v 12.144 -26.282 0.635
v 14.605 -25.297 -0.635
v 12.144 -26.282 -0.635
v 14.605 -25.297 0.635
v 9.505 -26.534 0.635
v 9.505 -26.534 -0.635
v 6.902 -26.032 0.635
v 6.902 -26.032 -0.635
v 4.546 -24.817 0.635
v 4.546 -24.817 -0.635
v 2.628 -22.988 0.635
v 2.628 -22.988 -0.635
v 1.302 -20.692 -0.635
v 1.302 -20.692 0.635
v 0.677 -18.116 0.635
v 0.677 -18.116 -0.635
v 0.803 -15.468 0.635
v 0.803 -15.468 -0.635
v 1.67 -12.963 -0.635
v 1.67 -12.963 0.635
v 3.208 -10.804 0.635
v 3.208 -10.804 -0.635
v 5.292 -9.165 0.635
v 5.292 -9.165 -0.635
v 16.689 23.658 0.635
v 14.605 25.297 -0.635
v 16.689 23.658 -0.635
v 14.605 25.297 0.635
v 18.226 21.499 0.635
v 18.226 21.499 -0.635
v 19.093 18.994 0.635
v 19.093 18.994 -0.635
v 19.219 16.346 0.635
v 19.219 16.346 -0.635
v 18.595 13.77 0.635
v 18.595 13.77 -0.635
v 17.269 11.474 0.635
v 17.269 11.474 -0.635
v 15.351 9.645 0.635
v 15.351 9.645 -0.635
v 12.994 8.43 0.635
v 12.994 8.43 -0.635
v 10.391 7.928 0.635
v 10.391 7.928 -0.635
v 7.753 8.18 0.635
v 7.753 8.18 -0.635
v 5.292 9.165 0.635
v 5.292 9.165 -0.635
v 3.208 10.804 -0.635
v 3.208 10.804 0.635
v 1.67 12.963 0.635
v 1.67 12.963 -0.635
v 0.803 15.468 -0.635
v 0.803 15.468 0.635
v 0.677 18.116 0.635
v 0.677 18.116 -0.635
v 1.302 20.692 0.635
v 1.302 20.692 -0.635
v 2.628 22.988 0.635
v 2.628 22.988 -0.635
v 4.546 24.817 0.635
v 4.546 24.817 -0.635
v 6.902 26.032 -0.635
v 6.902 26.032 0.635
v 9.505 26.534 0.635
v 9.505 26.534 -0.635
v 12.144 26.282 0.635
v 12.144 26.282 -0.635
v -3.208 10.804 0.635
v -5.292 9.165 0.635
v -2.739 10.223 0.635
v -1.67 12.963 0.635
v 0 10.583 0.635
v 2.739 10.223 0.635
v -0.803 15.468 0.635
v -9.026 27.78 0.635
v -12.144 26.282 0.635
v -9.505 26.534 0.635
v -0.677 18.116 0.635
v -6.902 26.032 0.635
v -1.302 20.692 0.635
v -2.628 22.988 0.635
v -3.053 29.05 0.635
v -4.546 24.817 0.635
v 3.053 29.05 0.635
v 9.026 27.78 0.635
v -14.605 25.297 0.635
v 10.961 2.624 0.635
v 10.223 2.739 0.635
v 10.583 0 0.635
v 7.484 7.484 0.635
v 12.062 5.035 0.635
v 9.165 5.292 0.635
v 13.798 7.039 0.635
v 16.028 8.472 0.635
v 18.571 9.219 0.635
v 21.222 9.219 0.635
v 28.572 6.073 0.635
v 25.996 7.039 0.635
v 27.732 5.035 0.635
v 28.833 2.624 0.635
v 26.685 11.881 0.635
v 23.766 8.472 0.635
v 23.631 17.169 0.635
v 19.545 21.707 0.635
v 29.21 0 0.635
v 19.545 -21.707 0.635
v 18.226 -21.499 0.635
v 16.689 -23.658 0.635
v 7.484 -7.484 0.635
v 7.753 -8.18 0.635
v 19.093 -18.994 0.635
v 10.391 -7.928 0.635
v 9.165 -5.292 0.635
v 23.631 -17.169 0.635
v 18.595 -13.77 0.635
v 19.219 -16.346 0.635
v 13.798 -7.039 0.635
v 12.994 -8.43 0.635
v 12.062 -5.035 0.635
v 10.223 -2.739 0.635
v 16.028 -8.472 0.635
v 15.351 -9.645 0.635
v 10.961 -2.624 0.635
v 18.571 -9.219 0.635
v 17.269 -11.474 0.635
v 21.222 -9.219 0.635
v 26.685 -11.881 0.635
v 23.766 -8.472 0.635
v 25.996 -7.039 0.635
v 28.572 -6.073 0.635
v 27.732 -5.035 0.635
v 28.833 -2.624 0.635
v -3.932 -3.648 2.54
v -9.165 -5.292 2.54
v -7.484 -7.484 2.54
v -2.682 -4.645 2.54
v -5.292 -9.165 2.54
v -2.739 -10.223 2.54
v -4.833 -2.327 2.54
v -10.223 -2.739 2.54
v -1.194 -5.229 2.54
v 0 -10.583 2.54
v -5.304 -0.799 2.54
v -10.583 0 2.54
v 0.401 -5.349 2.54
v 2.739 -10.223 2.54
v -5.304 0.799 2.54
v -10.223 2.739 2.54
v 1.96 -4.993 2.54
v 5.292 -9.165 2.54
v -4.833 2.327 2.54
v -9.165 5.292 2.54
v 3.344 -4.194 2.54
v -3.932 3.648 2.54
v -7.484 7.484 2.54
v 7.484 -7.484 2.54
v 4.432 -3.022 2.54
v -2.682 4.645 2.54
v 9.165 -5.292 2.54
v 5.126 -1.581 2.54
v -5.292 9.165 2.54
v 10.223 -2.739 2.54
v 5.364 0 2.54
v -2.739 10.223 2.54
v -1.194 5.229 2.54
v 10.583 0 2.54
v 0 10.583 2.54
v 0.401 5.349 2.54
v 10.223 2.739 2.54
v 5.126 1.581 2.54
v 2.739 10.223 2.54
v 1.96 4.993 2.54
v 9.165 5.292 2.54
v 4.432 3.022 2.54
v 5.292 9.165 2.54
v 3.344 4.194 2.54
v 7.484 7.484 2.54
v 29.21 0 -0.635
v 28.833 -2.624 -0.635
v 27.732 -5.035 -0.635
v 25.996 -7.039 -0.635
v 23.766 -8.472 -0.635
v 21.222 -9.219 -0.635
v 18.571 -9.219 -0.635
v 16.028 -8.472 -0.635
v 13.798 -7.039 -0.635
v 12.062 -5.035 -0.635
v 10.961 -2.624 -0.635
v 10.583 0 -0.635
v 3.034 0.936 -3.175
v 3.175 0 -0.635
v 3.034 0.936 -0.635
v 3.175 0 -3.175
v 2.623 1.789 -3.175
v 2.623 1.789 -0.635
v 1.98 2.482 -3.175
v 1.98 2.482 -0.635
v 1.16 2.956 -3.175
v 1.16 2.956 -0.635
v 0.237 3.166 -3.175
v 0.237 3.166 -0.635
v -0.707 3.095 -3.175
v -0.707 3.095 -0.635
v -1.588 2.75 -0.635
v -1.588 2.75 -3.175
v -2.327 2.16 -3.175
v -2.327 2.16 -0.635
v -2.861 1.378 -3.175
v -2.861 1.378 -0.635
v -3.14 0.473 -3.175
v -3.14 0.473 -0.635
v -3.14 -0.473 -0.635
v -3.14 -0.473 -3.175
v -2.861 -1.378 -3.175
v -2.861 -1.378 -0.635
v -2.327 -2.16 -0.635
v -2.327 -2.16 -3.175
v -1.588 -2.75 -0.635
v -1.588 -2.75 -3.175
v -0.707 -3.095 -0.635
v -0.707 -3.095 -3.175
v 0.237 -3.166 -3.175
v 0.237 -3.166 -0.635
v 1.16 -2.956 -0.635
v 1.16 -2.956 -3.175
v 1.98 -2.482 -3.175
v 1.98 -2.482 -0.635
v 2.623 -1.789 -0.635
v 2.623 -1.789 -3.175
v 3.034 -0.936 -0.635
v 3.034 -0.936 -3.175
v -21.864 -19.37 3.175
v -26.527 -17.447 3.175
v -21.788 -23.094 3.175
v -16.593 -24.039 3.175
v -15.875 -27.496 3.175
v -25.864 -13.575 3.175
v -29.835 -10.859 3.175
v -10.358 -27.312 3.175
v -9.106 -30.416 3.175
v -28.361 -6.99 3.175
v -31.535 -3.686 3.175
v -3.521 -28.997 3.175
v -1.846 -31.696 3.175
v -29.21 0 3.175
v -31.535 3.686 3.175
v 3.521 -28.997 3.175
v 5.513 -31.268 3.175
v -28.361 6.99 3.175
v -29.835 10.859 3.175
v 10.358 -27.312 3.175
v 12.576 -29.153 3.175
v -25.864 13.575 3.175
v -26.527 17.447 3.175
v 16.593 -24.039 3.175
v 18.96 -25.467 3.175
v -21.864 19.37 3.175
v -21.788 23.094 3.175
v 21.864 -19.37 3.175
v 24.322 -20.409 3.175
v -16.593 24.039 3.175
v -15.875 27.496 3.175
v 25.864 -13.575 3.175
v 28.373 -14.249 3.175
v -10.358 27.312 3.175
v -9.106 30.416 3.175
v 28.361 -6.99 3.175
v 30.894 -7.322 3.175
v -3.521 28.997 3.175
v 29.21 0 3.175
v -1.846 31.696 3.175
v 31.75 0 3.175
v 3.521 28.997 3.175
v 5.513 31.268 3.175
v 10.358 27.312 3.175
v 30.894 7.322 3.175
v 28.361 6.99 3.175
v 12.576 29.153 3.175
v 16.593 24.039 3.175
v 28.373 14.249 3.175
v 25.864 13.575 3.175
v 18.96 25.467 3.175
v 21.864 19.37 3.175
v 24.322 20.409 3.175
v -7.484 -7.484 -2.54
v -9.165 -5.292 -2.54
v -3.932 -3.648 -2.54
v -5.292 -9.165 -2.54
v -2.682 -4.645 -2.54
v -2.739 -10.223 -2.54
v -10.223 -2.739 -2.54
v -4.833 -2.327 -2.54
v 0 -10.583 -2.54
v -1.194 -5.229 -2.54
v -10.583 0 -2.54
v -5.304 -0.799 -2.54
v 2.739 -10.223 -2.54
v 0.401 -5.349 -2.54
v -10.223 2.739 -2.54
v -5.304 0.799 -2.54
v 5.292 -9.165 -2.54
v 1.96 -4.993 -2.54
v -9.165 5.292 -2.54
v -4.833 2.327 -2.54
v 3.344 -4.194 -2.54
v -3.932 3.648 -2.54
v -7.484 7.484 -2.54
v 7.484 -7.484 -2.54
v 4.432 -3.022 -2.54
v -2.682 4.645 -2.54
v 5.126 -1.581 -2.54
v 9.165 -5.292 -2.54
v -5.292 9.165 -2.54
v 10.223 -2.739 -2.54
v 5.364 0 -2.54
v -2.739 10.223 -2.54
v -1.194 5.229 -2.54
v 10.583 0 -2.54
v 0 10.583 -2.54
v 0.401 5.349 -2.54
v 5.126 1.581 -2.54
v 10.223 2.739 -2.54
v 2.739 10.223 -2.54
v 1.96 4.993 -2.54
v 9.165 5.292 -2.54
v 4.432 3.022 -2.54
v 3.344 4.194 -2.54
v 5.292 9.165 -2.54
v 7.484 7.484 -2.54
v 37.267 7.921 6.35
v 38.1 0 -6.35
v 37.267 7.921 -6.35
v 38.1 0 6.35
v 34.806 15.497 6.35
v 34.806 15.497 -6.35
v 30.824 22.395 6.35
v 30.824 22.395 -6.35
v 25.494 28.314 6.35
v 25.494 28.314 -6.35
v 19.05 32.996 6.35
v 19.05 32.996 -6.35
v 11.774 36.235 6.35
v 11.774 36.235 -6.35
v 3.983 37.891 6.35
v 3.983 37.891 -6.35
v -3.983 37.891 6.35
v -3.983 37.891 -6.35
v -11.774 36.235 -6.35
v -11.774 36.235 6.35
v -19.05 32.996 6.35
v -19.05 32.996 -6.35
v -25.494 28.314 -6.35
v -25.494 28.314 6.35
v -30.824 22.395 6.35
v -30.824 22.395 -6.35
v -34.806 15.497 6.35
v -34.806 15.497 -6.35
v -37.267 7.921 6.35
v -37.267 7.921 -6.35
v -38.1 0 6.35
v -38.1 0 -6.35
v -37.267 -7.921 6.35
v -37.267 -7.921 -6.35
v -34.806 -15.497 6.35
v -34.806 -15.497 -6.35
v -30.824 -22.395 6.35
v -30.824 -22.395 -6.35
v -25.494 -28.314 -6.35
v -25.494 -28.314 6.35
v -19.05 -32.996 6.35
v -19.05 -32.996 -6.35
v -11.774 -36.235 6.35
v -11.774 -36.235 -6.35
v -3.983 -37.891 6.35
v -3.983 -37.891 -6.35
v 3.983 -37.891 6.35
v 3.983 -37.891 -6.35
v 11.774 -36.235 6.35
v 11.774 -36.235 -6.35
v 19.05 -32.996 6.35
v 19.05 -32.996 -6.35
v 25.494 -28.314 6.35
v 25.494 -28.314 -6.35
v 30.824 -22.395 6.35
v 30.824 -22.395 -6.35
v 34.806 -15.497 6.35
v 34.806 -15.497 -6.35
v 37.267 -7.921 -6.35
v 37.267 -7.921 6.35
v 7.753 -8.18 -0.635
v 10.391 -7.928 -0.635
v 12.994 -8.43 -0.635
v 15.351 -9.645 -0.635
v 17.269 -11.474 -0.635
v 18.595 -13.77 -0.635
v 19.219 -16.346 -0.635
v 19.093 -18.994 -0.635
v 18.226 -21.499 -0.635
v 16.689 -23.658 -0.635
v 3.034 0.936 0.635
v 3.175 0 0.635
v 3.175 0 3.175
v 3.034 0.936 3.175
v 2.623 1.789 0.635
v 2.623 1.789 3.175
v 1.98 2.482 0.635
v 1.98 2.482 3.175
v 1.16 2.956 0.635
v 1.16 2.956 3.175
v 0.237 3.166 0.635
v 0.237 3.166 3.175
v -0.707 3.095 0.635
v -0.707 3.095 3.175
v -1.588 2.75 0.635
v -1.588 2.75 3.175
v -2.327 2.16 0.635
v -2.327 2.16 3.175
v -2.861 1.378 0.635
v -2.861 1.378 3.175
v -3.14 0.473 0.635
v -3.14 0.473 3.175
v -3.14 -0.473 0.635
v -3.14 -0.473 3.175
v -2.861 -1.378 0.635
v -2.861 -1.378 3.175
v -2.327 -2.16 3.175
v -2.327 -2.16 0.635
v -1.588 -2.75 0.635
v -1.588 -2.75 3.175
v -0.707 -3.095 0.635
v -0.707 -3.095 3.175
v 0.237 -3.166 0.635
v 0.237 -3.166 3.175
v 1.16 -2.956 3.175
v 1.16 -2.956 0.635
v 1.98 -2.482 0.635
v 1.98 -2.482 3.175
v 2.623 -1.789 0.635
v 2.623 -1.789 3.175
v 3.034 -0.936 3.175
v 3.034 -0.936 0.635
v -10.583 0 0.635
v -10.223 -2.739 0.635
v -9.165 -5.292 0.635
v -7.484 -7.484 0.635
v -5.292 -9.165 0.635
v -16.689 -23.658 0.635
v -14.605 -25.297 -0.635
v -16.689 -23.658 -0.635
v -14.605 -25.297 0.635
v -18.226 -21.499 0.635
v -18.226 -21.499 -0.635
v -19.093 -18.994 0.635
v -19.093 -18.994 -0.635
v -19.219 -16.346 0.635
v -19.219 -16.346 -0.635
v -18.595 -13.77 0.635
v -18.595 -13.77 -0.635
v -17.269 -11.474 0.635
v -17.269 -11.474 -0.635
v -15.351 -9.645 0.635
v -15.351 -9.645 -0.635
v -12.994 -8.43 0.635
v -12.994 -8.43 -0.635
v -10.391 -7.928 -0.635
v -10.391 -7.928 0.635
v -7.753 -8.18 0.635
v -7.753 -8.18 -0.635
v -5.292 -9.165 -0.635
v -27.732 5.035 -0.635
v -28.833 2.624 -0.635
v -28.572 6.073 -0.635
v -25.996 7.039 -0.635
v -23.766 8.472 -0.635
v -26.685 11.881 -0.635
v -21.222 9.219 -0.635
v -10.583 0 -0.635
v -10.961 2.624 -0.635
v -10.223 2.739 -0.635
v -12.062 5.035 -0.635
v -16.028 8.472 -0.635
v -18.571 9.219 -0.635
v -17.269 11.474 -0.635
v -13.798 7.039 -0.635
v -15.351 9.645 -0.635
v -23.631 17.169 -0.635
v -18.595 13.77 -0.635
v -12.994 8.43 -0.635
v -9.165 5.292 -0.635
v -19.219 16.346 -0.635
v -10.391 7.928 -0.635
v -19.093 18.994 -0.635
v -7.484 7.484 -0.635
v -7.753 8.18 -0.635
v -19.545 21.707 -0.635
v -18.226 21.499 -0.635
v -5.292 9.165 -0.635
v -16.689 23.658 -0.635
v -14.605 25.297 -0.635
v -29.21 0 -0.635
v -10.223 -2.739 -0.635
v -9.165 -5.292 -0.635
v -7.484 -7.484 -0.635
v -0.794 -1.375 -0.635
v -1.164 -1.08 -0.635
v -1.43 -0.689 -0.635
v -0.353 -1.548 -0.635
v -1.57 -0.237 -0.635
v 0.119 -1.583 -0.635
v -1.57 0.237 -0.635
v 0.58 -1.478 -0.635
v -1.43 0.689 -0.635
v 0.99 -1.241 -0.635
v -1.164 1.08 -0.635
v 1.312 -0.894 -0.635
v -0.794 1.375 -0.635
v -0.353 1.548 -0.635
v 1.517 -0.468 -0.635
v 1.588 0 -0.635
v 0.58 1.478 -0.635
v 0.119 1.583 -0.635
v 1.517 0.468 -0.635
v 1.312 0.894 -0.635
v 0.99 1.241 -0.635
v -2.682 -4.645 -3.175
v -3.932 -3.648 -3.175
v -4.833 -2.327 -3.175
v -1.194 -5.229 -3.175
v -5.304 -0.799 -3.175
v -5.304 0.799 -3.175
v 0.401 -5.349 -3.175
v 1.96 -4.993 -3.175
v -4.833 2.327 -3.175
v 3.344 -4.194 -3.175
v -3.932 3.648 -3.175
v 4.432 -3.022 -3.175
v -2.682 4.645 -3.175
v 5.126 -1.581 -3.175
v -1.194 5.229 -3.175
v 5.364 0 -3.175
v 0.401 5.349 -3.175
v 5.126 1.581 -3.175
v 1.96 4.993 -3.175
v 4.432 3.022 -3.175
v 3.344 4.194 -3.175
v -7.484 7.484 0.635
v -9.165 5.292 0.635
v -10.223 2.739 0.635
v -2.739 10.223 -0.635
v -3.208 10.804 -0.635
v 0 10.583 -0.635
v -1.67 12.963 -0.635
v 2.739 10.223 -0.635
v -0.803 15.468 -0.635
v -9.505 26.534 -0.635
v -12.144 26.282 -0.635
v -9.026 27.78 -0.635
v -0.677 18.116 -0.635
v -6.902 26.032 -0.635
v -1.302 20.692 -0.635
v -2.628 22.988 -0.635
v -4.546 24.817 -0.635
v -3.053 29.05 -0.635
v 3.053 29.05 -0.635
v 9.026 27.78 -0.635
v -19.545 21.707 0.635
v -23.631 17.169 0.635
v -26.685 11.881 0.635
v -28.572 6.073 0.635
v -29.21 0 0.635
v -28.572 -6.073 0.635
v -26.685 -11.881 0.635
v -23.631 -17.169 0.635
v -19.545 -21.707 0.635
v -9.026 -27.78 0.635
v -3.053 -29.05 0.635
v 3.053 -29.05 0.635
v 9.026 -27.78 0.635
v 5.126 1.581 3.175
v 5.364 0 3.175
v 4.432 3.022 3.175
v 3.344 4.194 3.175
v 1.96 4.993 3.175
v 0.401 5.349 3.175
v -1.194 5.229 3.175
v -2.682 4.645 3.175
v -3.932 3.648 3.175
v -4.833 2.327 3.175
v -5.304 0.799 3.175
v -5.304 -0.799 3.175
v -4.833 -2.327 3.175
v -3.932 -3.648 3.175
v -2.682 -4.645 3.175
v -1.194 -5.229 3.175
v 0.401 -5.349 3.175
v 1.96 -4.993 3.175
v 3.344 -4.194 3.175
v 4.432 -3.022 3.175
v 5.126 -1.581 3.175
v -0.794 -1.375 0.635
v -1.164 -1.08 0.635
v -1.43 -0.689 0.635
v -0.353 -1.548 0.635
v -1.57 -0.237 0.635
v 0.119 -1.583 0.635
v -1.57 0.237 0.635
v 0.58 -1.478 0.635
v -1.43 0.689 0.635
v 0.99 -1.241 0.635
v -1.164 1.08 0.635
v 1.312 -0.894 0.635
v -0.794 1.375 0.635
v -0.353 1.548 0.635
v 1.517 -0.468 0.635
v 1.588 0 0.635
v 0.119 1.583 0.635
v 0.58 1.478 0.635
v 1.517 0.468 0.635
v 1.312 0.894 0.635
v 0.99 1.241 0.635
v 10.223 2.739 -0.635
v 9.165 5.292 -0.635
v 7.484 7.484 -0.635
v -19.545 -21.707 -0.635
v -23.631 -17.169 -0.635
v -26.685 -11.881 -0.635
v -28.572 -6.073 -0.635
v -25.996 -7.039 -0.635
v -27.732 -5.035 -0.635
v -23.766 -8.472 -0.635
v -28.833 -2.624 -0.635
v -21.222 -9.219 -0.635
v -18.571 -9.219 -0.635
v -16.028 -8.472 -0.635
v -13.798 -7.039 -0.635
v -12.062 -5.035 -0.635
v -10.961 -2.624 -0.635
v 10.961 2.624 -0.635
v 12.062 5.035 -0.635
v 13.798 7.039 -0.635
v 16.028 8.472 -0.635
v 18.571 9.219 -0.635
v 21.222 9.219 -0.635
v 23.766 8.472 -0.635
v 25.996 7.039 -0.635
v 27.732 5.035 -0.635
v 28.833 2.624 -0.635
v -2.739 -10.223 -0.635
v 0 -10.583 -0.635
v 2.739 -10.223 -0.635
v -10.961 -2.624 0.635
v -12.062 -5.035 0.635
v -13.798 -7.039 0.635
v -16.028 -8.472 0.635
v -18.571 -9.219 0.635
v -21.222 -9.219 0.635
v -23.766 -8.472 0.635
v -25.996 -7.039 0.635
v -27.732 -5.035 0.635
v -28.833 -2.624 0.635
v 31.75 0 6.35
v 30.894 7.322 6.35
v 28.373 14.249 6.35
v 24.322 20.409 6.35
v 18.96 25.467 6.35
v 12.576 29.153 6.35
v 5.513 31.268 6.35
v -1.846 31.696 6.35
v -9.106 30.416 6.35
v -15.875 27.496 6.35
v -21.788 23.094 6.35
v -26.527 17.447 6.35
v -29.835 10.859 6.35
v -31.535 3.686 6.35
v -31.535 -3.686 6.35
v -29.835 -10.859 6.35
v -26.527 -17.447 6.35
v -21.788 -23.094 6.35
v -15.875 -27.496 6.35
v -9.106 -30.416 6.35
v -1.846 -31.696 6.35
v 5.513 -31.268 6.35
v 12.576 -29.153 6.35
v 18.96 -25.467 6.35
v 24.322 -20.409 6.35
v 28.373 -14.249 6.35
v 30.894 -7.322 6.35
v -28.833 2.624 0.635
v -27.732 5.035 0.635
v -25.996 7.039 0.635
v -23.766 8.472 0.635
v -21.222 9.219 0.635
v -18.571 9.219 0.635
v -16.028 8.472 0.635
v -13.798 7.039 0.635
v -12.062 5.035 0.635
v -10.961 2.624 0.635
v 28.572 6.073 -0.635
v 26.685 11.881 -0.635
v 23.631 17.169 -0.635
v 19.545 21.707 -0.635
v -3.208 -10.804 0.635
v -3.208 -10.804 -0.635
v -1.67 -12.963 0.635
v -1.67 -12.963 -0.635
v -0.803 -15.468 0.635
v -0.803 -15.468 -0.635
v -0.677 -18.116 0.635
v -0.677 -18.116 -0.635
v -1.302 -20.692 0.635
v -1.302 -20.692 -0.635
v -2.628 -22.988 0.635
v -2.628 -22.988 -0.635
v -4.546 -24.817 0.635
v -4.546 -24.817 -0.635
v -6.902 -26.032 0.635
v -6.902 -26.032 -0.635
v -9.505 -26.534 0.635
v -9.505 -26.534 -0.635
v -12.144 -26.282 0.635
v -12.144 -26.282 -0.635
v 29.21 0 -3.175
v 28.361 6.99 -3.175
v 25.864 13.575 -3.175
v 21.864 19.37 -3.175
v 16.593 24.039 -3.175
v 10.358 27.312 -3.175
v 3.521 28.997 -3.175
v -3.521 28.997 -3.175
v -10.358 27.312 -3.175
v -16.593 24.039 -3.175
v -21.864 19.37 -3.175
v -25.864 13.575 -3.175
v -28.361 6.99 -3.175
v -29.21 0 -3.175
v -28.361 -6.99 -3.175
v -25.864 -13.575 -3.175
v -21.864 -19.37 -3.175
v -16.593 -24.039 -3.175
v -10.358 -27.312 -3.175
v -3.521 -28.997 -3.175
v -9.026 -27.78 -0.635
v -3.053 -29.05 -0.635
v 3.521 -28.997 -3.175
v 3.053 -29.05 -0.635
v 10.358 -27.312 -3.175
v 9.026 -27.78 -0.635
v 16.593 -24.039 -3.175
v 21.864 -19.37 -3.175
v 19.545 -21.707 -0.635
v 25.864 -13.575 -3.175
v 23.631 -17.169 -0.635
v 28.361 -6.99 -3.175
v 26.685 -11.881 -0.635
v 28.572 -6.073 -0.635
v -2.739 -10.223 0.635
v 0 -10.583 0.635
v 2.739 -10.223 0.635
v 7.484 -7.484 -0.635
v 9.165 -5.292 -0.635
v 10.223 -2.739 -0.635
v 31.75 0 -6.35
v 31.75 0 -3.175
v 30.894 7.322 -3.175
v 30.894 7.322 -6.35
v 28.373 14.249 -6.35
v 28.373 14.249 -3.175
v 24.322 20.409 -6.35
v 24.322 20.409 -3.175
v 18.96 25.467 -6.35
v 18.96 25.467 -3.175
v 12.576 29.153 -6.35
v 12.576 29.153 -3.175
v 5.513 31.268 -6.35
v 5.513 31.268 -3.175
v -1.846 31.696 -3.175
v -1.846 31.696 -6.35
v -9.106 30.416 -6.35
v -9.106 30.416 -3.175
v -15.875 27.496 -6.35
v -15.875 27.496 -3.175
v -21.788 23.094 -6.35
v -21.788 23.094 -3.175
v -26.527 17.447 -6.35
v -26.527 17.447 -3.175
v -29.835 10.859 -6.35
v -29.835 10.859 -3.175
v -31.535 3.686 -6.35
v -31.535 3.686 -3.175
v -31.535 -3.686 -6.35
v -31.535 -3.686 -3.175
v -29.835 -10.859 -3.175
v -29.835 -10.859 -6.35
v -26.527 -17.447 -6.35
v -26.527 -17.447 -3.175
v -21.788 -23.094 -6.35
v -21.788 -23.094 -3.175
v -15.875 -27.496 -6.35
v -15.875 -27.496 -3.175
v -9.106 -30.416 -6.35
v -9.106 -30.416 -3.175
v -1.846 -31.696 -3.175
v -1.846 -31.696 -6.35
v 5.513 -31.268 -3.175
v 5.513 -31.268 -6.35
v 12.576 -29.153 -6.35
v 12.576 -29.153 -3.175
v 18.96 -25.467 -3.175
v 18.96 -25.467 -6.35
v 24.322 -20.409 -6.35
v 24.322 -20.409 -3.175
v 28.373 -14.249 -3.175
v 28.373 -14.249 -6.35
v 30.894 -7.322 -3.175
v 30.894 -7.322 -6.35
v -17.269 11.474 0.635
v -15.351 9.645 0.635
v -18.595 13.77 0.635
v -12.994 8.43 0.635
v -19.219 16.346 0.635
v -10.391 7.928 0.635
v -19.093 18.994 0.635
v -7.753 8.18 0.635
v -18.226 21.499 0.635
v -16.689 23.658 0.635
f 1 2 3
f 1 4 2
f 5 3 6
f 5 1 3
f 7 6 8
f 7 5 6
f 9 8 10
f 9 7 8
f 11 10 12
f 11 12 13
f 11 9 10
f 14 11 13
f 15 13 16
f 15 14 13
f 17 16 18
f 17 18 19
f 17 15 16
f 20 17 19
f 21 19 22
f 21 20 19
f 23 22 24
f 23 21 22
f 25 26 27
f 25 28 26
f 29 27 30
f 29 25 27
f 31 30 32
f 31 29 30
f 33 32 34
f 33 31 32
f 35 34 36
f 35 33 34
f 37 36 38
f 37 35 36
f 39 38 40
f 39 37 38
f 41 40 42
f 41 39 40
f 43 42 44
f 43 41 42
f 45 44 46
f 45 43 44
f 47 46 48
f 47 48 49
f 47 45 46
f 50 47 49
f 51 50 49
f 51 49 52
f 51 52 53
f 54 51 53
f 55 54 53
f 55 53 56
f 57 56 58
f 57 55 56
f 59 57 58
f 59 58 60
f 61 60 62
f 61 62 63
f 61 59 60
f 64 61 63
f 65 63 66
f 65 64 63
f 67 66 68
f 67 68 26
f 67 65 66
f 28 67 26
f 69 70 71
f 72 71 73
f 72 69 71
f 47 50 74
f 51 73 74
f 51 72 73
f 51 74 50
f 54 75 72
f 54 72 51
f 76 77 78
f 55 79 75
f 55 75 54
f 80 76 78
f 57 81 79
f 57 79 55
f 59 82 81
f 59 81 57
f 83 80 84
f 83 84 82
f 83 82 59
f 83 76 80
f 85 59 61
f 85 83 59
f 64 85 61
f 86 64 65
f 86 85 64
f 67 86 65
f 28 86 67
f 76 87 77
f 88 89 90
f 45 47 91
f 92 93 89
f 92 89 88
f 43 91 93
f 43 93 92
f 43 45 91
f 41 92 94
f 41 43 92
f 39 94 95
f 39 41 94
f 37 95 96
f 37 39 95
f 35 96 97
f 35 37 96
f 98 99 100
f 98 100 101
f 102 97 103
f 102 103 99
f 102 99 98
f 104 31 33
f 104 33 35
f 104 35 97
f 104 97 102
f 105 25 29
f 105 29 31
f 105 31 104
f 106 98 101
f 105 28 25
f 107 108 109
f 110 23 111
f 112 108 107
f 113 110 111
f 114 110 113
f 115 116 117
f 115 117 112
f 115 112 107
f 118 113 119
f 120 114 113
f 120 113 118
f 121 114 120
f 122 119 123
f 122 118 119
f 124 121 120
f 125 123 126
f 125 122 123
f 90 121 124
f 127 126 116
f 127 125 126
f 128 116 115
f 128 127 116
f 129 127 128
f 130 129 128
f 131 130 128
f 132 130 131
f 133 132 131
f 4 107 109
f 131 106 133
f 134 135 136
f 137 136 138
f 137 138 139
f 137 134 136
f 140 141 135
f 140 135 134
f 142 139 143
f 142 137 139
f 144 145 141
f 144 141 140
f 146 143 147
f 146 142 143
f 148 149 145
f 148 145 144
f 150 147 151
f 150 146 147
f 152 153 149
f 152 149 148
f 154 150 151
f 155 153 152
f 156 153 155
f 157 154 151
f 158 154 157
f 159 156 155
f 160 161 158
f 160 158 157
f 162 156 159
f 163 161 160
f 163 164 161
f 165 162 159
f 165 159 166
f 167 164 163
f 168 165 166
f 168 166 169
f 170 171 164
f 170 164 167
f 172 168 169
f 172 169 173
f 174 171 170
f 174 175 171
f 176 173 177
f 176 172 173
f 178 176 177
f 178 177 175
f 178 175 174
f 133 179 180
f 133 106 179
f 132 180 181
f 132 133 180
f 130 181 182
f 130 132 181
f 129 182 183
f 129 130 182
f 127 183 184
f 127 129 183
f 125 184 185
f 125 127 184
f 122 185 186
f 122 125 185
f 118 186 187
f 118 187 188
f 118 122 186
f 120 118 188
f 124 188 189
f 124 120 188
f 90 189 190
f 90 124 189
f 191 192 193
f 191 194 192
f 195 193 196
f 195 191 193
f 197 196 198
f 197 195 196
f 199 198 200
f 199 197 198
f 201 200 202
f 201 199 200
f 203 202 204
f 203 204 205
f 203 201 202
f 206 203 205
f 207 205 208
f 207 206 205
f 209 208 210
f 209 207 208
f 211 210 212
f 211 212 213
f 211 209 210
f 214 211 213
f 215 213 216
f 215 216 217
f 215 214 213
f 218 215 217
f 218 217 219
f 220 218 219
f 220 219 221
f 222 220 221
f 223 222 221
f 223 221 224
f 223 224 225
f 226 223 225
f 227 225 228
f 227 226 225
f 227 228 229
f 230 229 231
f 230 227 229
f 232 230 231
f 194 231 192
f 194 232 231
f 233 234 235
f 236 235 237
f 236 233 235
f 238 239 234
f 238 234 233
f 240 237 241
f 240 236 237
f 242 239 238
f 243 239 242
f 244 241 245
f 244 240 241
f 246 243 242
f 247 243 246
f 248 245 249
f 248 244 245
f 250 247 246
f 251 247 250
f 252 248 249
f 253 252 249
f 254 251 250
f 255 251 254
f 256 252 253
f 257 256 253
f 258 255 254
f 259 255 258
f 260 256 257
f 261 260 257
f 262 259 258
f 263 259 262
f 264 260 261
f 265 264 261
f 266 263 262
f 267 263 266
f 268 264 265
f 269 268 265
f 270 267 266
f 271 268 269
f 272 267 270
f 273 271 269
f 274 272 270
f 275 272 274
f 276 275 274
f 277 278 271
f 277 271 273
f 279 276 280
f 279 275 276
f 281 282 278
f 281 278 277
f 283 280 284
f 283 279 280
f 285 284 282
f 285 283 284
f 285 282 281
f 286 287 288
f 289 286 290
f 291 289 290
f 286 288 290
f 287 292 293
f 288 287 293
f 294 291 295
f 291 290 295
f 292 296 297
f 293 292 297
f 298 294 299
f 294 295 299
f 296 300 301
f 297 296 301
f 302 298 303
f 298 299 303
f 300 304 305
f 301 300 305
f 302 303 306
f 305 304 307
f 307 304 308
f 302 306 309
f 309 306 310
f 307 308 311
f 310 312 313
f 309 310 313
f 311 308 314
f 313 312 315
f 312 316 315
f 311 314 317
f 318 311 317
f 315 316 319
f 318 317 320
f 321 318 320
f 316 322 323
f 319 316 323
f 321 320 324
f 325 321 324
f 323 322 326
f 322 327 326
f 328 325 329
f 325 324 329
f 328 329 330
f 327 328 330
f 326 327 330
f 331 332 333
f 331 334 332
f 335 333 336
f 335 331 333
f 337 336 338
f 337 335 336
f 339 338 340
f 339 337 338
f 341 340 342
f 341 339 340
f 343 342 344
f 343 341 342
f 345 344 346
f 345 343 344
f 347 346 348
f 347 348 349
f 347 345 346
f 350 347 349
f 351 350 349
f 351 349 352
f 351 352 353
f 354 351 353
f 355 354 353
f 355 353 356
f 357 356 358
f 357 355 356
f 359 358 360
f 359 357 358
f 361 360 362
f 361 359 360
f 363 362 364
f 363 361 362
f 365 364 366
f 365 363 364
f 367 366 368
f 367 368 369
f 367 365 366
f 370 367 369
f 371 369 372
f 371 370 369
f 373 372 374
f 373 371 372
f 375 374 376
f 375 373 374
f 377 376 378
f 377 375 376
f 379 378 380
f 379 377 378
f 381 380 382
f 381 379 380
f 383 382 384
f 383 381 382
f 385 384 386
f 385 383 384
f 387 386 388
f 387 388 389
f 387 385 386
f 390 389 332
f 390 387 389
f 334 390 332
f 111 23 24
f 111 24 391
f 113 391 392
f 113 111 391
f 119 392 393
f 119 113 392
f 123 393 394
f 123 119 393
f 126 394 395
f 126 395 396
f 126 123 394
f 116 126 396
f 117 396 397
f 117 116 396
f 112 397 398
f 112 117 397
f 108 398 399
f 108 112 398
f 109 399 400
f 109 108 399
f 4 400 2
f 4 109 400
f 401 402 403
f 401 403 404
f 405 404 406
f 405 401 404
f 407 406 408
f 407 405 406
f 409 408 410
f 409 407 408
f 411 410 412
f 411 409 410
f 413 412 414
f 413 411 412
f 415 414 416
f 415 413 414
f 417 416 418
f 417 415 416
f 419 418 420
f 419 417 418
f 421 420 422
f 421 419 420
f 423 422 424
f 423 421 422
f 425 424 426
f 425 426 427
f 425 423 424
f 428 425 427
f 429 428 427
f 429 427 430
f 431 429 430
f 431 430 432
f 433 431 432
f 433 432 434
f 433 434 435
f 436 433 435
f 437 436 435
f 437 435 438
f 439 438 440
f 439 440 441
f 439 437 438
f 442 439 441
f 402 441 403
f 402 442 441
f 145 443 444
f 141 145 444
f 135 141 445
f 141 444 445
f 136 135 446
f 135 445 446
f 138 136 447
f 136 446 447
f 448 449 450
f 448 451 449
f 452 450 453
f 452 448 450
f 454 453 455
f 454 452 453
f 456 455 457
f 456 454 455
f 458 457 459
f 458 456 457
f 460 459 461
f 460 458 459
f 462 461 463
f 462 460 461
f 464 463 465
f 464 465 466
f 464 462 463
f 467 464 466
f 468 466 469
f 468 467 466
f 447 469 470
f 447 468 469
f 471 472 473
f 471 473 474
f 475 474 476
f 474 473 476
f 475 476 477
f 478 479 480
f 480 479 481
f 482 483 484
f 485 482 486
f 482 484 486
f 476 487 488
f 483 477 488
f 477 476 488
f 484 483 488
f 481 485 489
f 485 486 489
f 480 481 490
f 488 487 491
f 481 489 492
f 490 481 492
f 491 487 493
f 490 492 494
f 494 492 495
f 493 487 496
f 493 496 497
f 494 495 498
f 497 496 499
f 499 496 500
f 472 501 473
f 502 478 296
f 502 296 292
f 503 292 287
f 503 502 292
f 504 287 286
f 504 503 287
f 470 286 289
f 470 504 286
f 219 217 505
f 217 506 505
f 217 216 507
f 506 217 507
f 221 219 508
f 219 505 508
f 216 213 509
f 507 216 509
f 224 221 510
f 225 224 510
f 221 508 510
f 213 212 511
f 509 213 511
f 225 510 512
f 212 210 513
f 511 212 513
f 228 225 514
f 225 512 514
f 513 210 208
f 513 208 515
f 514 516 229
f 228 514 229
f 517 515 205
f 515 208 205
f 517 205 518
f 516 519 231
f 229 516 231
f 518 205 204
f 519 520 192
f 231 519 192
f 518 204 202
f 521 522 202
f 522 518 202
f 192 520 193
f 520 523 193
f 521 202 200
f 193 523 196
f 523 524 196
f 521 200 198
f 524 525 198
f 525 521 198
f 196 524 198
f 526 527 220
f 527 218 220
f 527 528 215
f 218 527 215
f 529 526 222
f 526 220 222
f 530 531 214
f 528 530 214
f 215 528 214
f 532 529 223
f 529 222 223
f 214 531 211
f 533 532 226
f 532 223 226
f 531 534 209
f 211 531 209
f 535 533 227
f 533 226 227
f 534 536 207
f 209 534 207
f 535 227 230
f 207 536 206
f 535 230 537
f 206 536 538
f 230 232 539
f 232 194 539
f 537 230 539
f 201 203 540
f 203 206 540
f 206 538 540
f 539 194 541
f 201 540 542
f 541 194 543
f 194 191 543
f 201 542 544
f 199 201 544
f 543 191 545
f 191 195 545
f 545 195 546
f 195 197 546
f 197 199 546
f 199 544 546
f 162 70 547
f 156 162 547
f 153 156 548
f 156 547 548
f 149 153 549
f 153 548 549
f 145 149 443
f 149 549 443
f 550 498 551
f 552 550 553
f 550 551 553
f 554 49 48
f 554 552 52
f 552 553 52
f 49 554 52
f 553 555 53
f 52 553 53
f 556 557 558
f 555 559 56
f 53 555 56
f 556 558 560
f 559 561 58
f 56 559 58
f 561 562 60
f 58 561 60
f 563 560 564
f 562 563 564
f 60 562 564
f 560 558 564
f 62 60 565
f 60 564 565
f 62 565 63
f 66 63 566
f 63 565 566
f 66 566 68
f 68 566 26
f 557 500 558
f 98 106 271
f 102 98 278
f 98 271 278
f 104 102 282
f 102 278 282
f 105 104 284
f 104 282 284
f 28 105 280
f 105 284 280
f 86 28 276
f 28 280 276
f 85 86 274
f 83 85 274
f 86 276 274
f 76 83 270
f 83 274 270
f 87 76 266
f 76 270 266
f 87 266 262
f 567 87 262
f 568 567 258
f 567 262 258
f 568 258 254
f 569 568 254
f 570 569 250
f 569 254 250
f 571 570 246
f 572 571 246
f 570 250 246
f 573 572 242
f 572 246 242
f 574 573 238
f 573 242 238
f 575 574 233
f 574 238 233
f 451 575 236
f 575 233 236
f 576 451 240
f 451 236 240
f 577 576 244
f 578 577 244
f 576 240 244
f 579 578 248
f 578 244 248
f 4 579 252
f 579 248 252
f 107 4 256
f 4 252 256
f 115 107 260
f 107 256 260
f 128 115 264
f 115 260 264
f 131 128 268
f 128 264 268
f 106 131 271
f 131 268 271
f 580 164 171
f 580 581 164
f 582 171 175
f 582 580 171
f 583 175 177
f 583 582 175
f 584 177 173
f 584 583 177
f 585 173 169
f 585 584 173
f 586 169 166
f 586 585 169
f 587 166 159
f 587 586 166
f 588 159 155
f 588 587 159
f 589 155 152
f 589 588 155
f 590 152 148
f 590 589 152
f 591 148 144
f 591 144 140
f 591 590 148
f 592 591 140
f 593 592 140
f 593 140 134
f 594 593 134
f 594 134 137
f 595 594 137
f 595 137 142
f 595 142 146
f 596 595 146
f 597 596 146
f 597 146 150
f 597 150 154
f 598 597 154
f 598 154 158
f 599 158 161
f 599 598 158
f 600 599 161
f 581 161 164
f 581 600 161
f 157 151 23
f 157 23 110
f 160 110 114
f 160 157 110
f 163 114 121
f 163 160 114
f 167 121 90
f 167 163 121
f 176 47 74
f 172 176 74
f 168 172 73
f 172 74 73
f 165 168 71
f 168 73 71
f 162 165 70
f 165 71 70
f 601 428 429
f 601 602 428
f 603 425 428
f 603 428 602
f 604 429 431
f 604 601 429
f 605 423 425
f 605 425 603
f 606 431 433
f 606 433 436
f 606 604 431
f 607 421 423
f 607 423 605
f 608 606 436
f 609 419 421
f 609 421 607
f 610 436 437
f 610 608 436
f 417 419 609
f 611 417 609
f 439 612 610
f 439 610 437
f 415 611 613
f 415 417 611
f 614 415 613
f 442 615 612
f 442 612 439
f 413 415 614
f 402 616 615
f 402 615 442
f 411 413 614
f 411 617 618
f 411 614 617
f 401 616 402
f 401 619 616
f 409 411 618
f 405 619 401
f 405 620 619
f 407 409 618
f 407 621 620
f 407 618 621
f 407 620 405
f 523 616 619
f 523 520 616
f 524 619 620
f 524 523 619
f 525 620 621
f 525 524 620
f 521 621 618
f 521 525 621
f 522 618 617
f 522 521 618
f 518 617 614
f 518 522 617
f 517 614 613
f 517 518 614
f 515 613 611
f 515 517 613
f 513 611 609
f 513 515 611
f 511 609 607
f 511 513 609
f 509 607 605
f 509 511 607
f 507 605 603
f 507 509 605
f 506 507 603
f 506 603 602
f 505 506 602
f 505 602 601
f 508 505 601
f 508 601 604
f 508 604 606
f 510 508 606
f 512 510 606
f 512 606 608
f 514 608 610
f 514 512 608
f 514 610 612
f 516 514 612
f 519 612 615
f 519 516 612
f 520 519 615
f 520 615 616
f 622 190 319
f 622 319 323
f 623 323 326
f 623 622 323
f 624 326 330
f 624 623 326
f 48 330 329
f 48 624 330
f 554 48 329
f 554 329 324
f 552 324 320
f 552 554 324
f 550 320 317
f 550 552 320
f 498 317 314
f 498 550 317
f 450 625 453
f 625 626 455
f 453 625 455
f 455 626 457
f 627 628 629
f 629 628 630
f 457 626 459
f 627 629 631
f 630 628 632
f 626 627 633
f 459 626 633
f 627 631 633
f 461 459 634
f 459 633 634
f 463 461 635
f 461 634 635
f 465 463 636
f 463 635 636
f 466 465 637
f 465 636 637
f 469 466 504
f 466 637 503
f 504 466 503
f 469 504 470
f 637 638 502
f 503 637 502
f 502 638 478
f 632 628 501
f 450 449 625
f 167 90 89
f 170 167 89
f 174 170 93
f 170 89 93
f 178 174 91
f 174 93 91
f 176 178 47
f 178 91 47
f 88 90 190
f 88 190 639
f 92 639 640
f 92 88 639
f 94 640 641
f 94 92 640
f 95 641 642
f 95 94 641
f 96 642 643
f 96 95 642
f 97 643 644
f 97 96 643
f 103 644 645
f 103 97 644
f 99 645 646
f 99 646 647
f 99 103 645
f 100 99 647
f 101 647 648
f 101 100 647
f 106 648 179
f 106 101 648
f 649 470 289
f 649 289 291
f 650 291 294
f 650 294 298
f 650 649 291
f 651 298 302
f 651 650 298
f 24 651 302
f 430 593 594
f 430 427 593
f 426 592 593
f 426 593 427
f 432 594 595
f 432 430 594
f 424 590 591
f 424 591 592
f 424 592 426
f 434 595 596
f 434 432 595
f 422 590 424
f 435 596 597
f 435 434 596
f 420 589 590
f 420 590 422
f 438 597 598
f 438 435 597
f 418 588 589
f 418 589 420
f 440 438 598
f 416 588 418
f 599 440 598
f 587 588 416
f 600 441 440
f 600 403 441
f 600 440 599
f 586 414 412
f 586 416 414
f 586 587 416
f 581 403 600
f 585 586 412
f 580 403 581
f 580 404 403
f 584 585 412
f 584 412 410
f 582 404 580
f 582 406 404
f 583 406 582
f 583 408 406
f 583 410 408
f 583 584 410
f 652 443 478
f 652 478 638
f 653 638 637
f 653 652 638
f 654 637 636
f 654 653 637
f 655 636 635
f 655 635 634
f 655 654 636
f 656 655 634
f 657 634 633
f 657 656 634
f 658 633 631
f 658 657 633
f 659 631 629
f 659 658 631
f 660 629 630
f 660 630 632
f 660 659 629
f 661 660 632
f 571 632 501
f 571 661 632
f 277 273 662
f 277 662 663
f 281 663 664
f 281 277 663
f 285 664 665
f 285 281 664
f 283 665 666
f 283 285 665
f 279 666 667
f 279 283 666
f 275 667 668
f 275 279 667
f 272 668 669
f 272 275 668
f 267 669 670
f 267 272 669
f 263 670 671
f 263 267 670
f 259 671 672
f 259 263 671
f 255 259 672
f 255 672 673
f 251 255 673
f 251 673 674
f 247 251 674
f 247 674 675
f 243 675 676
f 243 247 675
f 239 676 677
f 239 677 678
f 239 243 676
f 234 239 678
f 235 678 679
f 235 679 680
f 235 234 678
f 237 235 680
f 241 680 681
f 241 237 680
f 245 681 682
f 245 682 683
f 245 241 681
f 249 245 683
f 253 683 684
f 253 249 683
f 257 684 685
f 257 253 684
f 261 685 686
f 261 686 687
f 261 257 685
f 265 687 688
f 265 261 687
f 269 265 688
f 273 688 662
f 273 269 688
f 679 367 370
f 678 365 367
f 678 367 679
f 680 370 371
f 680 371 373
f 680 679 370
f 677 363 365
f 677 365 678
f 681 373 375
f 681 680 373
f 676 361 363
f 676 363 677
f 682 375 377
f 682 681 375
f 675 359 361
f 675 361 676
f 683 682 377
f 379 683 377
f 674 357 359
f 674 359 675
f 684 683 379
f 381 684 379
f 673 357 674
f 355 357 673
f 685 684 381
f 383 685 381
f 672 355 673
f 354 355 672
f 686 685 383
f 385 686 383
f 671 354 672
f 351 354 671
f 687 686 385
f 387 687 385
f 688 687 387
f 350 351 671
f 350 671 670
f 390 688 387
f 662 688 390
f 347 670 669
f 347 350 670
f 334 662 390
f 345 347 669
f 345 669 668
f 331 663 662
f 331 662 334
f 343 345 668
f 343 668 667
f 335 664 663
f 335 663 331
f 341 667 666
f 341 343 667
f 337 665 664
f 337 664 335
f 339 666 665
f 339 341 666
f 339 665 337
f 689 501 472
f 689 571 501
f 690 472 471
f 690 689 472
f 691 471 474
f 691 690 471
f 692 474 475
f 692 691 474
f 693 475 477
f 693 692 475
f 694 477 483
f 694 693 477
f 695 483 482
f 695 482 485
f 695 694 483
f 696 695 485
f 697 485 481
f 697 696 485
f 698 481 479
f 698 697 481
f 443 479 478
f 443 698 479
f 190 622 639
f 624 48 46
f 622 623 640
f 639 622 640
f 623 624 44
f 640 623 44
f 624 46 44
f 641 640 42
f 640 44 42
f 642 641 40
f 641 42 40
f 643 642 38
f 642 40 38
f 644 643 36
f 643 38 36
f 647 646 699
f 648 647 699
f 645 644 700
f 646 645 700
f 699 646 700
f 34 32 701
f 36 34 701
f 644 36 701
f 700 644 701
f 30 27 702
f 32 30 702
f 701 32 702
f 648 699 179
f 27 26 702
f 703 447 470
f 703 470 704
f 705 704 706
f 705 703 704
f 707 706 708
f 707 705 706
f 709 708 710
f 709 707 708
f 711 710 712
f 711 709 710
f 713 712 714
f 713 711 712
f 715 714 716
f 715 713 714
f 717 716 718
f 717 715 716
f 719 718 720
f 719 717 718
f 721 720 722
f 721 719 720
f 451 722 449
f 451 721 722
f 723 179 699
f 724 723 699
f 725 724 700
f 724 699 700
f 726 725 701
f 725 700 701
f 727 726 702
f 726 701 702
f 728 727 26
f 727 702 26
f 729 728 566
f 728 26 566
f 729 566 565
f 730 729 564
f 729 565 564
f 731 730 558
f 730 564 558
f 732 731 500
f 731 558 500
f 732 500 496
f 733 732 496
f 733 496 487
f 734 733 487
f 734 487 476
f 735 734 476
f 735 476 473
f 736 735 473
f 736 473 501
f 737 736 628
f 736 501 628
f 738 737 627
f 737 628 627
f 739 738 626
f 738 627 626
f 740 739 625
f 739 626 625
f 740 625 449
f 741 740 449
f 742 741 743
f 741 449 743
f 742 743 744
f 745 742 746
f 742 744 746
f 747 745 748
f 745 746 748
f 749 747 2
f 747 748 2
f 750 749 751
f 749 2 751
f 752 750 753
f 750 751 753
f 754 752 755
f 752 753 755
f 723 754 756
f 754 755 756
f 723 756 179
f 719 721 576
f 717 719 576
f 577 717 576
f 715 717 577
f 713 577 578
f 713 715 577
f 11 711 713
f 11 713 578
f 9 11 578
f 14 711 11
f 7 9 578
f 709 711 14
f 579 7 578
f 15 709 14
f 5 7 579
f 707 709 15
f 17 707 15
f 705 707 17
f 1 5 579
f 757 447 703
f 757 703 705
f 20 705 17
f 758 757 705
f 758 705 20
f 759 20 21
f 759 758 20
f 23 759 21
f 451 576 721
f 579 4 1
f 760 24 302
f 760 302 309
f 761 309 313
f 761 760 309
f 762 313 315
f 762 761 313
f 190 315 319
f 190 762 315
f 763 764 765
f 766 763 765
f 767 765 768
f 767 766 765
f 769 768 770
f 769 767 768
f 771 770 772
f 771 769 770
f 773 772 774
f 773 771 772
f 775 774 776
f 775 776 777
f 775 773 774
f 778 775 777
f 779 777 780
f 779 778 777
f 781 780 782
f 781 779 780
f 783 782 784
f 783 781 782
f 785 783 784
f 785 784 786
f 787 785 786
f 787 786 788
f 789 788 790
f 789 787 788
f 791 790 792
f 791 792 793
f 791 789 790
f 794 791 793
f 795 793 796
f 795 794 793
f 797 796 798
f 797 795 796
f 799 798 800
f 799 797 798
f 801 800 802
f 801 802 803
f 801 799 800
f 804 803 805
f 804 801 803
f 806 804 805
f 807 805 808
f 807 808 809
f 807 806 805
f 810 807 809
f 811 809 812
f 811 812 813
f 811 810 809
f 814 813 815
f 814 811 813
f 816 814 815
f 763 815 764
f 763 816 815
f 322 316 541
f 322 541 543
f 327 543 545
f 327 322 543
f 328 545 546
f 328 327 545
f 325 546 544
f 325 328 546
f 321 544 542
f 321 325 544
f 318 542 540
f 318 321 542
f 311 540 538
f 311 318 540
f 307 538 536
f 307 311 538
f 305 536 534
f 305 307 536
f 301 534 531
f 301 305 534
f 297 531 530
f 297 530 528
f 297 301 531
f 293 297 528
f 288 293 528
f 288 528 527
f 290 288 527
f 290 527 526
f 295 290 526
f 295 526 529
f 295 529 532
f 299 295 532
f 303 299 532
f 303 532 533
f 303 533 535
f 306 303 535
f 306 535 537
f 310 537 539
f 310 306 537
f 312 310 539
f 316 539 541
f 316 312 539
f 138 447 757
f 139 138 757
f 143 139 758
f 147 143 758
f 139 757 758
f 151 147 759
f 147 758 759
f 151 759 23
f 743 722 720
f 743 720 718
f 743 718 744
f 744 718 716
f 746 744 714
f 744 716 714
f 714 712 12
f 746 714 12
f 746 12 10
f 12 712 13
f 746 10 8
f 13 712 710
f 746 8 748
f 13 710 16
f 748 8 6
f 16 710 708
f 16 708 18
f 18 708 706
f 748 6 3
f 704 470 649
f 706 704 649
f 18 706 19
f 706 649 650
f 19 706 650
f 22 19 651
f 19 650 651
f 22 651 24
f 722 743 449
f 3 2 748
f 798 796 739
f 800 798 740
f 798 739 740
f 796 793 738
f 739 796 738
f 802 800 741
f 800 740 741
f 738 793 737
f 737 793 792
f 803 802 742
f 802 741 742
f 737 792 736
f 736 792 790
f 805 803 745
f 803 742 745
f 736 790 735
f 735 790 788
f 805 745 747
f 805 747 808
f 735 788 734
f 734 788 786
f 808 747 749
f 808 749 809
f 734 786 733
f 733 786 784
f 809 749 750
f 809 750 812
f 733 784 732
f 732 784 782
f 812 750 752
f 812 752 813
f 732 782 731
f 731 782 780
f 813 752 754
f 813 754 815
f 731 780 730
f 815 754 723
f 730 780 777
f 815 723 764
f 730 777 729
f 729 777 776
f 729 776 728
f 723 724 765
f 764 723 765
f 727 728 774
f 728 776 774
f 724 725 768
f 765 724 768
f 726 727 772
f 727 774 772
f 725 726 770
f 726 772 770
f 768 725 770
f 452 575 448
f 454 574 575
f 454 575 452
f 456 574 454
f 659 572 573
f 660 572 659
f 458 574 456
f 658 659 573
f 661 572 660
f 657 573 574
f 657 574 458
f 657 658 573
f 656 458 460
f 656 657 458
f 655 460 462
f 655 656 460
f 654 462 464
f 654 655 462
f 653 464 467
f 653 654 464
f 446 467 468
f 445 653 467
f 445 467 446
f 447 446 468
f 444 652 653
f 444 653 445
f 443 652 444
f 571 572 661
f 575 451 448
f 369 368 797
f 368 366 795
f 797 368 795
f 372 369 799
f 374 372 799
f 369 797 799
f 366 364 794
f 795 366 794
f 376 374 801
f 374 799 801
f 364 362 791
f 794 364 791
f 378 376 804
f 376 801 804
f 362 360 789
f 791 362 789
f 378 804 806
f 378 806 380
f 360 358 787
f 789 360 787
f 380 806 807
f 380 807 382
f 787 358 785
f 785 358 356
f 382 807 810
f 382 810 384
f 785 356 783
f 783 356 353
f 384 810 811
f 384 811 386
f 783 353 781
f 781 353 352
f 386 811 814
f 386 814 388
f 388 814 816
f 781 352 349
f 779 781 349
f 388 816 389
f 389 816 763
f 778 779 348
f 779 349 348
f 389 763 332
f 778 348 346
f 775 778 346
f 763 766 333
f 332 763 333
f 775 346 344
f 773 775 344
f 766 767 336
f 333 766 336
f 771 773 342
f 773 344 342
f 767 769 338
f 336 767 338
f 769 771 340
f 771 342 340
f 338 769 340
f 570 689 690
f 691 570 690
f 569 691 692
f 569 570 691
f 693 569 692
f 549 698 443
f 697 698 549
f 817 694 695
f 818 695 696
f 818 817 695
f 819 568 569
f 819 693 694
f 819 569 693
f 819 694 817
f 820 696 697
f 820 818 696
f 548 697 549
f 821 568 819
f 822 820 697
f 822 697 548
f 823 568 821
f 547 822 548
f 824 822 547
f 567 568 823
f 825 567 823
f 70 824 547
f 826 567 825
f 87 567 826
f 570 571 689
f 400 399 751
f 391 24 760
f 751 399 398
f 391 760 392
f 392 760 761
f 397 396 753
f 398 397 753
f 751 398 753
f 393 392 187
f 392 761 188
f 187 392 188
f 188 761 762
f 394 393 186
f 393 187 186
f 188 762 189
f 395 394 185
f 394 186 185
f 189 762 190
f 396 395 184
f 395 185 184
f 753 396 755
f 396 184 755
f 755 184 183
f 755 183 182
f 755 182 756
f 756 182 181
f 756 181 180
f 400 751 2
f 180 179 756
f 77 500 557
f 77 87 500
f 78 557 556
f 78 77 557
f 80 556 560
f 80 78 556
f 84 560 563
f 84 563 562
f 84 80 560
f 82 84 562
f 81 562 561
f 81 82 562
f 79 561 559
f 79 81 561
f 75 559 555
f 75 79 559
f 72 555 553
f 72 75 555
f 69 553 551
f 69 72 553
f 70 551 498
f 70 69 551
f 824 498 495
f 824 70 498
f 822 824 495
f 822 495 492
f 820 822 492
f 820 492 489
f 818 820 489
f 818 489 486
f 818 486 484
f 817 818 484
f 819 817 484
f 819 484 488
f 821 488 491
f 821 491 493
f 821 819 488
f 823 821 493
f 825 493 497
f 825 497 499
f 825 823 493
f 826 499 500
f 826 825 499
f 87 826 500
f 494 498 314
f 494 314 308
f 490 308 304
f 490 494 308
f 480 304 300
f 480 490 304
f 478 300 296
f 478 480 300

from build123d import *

# Parameters (mm, degrees)
SKETCH1_R             = 3.175
SKETCH1_R_2           = 1.5875
BOSS_EXTRUDE1_DEPTH   = 0.635
BOSS_EXTRUDE1_2_DEPTH = 0.635
BOSS_EXTRUDE1_3_DEPTH = 0.635
BOSS_EXTRUDE1_4_DEPTH = 0.635
BOSS_EXTRUDE1_5_DEPTH = 0.635
BOSS_EXTRUDE1_6_DEPTH = 0.635
BOSS_EXTRUDE1_7_DEPTH = 0.635
SKETCH1_3_R           = 31.75
SKETCH1_3_R_2         = 29.21
SKETCH1_3_R_3         = 5.363953164
SKETCH1_3_R_4         = 3.175
BOSS_EXTRUDE2_DEPTH   = 3.175
SKETCH1_4_R           = 5.363953164
BOSS_EXTRUDE4_DEPTH   = 2.54
SKETCH1_5_R           = 38.1
SKETCH1_5_R_2         = 31.75
BOSS_EXTRUDE5_DEPTH   = 6.35


with BuildPart() as part:
    # Sketch1 → Boss-Extrude1 (new, symmetric)
    with BuildSketch(Plane.XY):
        Circle(SKETCH1_R)
        Circle(SKETCH1_R_2, mode=Mode.SUBTRACT)
    extrude(amount=BOSS_EXTRUDE1_DEPTH, both=True)



with BuildPart() as body_2:
    # Sketch1 → Boss-Extrude1 2 (new, symmetric)
    with BuildSketch(Plane.XY):
        with BuildLine():
            ThreePointArc((29.21, 0), (19.896666667, -9.313333333), (10.583333333, 0))
            ThreePointArc((10.583333333, 0), (9.165435588, -5.291666555), (5.29166689, -9.165435395))
            ThreePointArc((5.29166689, -9.165435395), (18.013916746, -12.57435238), (14.604999698, -25.296602219))
            ThreePointArc((14.604999698, -25.296602219), (25.296601957, -14.605000151), (29.21, 0))
        make_face()
    extrude(amount=BOSS_EXTRUDE1_2_DEPTH, both=True)


with BuildPart() as body_3:
    # Sketch1 → Boss-Extrude1 3 (new, symmetric)
    with BuildSketch(Plane.XY):
        with BuildLine():
            ThreePointArc((5.291666671, 9.165435521), (9.165435525, 5.291666665), (10.583333333, 0))
            ThreePointArc((10.583333333, 0), (19.896666667, 9.313333333), (29.21, 0))
            ThreePointArc((29.21, 0), (25.296602069, 14.604999958), (14.605000083, 25.296601997))
            ThreePointArc((14.605000083, 25.296601997), (18.013916571, 12.574352078), (5.291666671, 9.165435521))
        make_face()
    extrude(amount=BOSS_EXTRUDE1_3_DEPTH, both=True)


with BuildPart() as body_4:
    # Sketch1 → Boss-Extrude1 4 (new, symmetric)
    with BuildSketch(Plane.XY):
        with BuildLine():
            ThreePointArc((-5.29166649, 9.165435626), (1.05e-07, 10.583333333), (5.291666671, 9.165435521))
            ThreePointArc((5.291666671, 9.165435521), (1.882750095, 21.88768549), (14.605000083, 25.296601997))
            ThreePointArc((14.605000083, 25.296601997), (8.9e-08, 29.21), (-14.604999928, 25.296602086))
            ThreePointArc((-14.604999928, 25.296602086), (-1.882750103, 21.887685503), (-5.29166649, 9.165435626))
        make_face()
    extrude(amount=BOSS_EXTRUDE1_4_DEPTH, both=True)


with BuildPart() as body_5:
    # Sketch1 → Boss-Extrude1 5 (new, symmetric)
    with BuildSketch(Plane.XY):
        with BuildLine():
            ThreePointArc((14.604999698, -25.296602219), (1.882749921, -21.887685188), (5.29166689, -9.165435395))
            ThreePointArc((5.29166689, -9.165435395), (2.57e-07, -10.583333333), (-5.291666445, -9.165435652))
            ThreePointArc((-5.291666445, -9.165435652), (-1.882750264, -21.887685783), (-14.605000442, -25.29660179))
            ThreePointArc((-14.605000442, -25.29660179), (-4.3e-07, -29.21), (14.604999698, -25.296602219))
        make_face()
    extrude(amount=BOSS_EXTRUDE1_5_DEPTH, both=True)


with BuildPart() as body_6:
    # Sketch1 → Boss-Extrude1 6 (new, symmetric)
    with BuildSketch(Plane.XY):
        with BuildLine():
            ThreePointArc((-10.583333333, 0), (-9.165435472, 5.291666755), (-5.29166649, 9.165435626))
            ThreePointArc((-5.29166649, 9.165435626), (-18.013916563, 12.574352065), (-14.604999928, 25.296602086))
            ThreePointArc((-14.604999928, 25.296602086), (-25.296602013, 14.605000055), (-29.21, 4.3e-08))
            ThreePointArc((-29.21, 4.3e-08), (-19.896666645, 9.313333333), (-10.583333333, 0))
        make_face()
    extrude(amount=BOSS_EXTRUDE1_6_DEPTH, both=True)


with BuildPart() as body_7:
    # Sketch1 → Boss-Extrude1 7 (new, symmetric)
    with BuildSketch(Plane.XY):
        with BuildLine():
            ThreePointArc((-14.605000442, -25.29660179), (-18.013916402, -12.574351785), (-5.291666445, -9.165435652))
            ThreePointArc((-5.291666445, -9.165435652), (-9.165435459, -5.291666778), (-10.583333333, 0))
            ThreePointArc((-10.583333333, 0), (-19.896666688, -9.313333333), (-29.21, 4.3e-08))
            ThreePointArc((-29.21, 4.3e-08), (-25.296602183, -14.60499976), (-14.605000442, -25.29660179))
        make_face()
    extrude(amount=BOSS_EXTRUDE1_7_DEPTH, both=True)


with BuildPart() as part_1:
    add(part.part)

    add(body_4.part)  # Boss-Extrude2 merges body 4

    add(body_7.part)  # Boss-Extrude2 merges body 7

    add(body_2.part)  # Boss-Extrude2 merges body 2
    # Sketch1<3> → Boss-Extrude2 (add, symmetric)
    # profile 1 of 2: a face of its own
    with BuildSketch(Plane.XY):
        Circle(SKETCH1_3_R)
        Circle(SKETCH1_3_R_2, mode=Mode.SUBTRACT)
    # profile 2 of 2: a face of its own
    with BuildSketch(Plane.XY):
        Circle(SKETCH1_3_R_3)
        Circle(SKETCH1_3_R_4, mode=Mode.SUBTRACT)
    extrude(amount=BOSS_EXTRUDE2_DEPTH, both=True)


    add(body_3.part)  # Boss-Extrude4 merges body 3

    add(body_5.part)  # Boss-Extrude4 merges body 5

    add(body_6.part)  # Boss-Extrude4 merges body 6
    # Sketch1<4> → Boss-Extrude4 (add, symmetric)
    with BuildSketch(Plane.XY):
        with BuildLine():
            ThreePointArc((5.29166689, -9.165435395), (9.165435588, -5.291666555), (10.583333333, 0))
            ThreePointArc((10.583333333, 0), (9.165435525, 5.291666665), (5.291666671, 9.165435521))
            ThreePointArc((5.291666671, 9.165435521), (1.05e-07, 10.583333333), (-5.29166649, 9.165435626))
            ThreePointArc((-5.29166649, 9.165435626), (-9.165435472, 5.291666755), (-10.583333333, 0))
            ThreePointArc((-10.583333333, 0), (-9.165435459, -5.291666778), (-5.291666445, -9.165435652))
            ThreePointArc((-5.291666445, -9.165435652), (2.57e-07, -10.583333333), (5.29166689, -9.165435395))
        make_face()
        Circle(SKETCH1_4_R, mode=Mode.SUBTRACT)
    extrude(amount=BOSS_EXTRUDE4_DEPTH, both=True)

    # Sketch1<5> → Boss-Extrude5 (add, symmetric)
    with BuildSketch(Plane.XY):
        Circle(SKETCH1_5_R)
        Circle(SKETCH1_5_R_2, mode=Mode.SUBTRACT)
    extrude(amount=BOSS_EXTRUDE5_DEPTH, both=True)


solid = part_1.part
